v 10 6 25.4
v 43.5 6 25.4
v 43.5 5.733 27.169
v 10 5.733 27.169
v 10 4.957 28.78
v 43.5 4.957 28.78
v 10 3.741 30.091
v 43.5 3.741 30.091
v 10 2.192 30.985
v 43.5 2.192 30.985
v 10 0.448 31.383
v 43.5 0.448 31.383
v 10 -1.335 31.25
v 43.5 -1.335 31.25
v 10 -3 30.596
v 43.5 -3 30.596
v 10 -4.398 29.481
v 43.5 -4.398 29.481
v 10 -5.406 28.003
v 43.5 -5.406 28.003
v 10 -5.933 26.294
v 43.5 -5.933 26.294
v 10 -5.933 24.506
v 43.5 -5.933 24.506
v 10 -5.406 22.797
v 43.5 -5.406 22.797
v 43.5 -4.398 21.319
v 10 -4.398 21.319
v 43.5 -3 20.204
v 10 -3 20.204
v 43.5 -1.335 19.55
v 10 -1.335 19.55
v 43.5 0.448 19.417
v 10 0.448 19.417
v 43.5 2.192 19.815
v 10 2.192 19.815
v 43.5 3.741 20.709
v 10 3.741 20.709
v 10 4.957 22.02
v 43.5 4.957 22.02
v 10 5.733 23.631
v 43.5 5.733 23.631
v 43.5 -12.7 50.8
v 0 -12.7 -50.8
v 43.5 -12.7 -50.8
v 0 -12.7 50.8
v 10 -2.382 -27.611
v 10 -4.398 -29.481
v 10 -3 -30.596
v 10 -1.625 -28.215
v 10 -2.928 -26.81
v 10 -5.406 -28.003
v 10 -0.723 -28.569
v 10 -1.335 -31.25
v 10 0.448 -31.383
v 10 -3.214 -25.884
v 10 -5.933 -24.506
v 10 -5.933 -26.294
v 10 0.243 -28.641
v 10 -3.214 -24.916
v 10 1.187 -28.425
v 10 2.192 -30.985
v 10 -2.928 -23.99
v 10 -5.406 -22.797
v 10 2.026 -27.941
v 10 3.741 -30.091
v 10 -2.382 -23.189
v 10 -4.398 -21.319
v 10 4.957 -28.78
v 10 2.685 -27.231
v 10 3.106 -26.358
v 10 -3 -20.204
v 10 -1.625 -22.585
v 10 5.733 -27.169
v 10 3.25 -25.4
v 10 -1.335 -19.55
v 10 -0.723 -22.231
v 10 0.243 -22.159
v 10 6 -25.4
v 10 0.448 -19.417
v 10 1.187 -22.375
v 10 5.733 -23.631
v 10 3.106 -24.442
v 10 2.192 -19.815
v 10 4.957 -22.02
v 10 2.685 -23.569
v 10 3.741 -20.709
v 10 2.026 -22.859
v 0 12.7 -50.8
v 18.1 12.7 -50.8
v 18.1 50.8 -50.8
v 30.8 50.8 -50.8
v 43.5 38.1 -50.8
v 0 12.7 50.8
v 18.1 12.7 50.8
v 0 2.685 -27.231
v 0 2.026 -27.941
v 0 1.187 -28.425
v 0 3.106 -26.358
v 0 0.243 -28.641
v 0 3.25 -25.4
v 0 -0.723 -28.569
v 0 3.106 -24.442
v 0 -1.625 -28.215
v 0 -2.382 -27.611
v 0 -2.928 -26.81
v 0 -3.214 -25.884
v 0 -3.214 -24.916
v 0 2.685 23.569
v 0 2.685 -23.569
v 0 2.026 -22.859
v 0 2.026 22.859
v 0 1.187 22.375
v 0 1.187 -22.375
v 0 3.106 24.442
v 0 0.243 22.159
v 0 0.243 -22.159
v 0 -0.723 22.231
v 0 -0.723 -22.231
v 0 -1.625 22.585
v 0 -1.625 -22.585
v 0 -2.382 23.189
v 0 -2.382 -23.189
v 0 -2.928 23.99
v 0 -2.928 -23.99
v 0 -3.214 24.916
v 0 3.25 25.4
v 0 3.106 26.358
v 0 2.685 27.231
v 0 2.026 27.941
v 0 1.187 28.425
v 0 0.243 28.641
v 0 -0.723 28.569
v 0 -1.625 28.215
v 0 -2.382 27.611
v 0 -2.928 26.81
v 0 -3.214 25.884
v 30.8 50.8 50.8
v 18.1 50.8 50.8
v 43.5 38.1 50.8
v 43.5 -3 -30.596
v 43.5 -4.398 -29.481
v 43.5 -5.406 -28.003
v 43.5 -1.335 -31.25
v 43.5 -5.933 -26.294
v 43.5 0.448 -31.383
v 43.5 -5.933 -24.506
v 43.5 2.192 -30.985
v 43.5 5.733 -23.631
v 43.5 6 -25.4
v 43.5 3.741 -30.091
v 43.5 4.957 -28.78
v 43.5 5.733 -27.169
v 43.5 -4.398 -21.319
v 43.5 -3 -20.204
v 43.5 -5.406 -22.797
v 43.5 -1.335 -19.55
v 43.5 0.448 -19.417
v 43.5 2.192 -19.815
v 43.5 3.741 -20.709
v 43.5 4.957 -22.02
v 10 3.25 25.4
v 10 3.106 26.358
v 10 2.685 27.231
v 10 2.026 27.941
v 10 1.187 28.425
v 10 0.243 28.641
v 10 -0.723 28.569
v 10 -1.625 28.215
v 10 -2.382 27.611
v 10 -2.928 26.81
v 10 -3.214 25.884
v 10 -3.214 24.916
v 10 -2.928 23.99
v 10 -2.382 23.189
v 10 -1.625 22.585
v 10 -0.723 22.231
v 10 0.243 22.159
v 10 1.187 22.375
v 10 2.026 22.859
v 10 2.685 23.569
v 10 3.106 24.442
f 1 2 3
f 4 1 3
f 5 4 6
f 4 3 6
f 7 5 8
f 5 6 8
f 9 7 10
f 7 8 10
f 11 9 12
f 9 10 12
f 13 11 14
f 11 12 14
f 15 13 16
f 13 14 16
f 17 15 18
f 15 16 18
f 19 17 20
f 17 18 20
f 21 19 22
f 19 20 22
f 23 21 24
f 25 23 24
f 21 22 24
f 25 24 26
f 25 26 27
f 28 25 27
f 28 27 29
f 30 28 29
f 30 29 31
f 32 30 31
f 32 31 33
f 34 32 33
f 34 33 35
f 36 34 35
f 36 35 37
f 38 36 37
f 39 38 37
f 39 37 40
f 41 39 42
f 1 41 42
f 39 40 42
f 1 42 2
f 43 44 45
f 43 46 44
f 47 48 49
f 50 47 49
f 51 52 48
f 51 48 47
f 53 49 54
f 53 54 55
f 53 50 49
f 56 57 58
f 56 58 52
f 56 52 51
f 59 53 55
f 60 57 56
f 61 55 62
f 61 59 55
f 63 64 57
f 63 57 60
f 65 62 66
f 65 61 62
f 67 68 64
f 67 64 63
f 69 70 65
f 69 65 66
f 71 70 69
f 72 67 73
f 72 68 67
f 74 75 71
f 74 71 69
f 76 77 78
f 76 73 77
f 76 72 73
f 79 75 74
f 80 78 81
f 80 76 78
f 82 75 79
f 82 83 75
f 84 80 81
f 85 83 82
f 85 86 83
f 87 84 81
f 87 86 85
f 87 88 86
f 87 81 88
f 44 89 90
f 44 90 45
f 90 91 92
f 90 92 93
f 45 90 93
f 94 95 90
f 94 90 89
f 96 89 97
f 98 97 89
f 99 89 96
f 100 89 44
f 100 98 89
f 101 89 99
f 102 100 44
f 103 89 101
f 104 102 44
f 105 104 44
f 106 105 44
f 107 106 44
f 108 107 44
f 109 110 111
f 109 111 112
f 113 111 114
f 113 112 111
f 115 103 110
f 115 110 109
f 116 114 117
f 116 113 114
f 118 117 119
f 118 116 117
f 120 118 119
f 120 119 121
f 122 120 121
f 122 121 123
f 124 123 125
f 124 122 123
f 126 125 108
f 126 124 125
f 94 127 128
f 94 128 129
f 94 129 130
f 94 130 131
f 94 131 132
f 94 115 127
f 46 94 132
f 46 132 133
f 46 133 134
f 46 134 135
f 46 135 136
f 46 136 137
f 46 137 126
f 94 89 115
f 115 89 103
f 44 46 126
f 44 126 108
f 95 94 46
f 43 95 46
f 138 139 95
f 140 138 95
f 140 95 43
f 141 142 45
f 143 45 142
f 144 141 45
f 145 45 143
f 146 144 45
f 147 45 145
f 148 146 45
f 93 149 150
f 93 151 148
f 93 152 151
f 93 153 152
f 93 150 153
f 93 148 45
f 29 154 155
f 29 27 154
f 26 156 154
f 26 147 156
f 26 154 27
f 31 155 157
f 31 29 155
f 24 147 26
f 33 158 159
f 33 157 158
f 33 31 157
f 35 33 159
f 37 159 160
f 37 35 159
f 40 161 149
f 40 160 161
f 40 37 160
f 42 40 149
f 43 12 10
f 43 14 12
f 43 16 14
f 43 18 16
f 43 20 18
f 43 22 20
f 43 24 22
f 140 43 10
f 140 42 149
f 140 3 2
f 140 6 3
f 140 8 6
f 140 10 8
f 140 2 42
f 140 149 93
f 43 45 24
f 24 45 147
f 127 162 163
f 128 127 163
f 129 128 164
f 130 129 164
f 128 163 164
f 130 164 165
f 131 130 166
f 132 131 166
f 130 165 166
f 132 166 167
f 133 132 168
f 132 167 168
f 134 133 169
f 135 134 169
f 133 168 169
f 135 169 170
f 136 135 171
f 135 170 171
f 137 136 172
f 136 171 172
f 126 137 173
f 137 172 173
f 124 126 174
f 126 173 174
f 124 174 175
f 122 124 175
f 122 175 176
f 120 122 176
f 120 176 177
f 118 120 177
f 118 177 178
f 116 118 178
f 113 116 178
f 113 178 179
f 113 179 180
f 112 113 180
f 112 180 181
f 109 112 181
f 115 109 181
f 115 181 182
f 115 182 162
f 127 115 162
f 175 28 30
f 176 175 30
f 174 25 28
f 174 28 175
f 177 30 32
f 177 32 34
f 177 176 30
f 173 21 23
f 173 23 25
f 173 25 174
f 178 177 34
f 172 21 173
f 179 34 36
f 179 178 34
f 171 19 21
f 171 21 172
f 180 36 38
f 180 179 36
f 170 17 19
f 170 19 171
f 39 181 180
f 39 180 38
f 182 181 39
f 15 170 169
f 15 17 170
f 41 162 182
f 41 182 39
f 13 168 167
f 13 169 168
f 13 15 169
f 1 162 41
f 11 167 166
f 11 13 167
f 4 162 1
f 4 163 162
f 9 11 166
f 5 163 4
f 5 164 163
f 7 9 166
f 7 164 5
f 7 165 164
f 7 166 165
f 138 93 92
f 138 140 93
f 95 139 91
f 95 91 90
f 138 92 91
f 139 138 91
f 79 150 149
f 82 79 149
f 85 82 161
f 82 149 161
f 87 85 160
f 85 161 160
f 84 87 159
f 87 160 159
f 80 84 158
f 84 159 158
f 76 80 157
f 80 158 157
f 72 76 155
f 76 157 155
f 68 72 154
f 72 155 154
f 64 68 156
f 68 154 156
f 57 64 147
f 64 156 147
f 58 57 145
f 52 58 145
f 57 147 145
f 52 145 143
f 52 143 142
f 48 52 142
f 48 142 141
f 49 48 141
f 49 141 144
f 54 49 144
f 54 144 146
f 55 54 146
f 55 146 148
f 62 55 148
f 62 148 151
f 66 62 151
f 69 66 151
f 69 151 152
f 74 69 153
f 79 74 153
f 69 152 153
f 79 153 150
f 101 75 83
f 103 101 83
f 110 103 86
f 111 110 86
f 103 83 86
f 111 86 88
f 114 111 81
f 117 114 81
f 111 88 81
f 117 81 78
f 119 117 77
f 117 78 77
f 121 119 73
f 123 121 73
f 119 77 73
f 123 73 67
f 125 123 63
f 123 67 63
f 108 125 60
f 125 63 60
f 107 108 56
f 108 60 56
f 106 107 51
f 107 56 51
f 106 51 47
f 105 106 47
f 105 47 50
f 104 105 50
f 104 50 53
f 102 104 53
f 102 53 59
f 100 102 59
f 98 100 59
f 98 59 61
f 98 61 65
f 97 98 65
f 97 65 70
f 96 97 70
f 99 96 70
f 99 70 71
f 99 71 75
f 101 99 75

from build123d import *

# Parameters (mm, degrees)
BOSS_EXTRUDE1_DEPTH = 50.8
SKETCH2_R           = 3.25
CUT_EXTRUDE1_DEPTH  = 84.985296332
SKETCH3_R           = 6
CUT_EXTRUDE2_DEPTH  = 33.5


with BuildPart() as part:
    # Sketch1 → Boss-Extrude1 (new, symmetric)
    with BuildSketch(Plane.XY):
        Polygon((43.5, 38.1), (30.8, 50.8), (18.1, 50.8), (18.1, 12.7), (0, 12.7), (0, -12.7), (43.5, -12.7), align=None)
    extrude(amount=BOSS_EXTRUDE1_DEPTH, both=True)

    # Sketch2 → Cut-Extrude1 (cut, through all)
    with BuildSketch(Plane(origin=(43.5, 0, 0), x_dir=(0, 0, -1), z_dir=(1, 0, 0))):
        with Locations(Location((-25.4, 0, 0), (0, 0, 90))):
            Circle(SKETCH2_R)
        with Locations(Location((25.4, 0, 0), (0, 0, 90))):
            Circle(SKETCH2_R)
    extrude(amount=-CUT_EXTRUDE1_DEPTH, mode=Mode.SUBTRACT)

    # Sketch3 → Cut-Extrude2 (cut)
    with BuildSketch(Plane(origin=(43.5, 0, 0), x_dir=(0, 0, -1), z_dir=(1, 0, 0))):
        with Locations(Location((-25.4, 0, 0), (0, 0, 90))):
            Circle(SKETCH3_R)
        with Locations(Location((25.4, 0, 0), (0, 0, 90))):
            Circle(SKETCH3_R)
    extrude(amount=-CUT_EXTRUDE2_DEPTH, mode=Mode.SUBTRACT)


solid = part.part
